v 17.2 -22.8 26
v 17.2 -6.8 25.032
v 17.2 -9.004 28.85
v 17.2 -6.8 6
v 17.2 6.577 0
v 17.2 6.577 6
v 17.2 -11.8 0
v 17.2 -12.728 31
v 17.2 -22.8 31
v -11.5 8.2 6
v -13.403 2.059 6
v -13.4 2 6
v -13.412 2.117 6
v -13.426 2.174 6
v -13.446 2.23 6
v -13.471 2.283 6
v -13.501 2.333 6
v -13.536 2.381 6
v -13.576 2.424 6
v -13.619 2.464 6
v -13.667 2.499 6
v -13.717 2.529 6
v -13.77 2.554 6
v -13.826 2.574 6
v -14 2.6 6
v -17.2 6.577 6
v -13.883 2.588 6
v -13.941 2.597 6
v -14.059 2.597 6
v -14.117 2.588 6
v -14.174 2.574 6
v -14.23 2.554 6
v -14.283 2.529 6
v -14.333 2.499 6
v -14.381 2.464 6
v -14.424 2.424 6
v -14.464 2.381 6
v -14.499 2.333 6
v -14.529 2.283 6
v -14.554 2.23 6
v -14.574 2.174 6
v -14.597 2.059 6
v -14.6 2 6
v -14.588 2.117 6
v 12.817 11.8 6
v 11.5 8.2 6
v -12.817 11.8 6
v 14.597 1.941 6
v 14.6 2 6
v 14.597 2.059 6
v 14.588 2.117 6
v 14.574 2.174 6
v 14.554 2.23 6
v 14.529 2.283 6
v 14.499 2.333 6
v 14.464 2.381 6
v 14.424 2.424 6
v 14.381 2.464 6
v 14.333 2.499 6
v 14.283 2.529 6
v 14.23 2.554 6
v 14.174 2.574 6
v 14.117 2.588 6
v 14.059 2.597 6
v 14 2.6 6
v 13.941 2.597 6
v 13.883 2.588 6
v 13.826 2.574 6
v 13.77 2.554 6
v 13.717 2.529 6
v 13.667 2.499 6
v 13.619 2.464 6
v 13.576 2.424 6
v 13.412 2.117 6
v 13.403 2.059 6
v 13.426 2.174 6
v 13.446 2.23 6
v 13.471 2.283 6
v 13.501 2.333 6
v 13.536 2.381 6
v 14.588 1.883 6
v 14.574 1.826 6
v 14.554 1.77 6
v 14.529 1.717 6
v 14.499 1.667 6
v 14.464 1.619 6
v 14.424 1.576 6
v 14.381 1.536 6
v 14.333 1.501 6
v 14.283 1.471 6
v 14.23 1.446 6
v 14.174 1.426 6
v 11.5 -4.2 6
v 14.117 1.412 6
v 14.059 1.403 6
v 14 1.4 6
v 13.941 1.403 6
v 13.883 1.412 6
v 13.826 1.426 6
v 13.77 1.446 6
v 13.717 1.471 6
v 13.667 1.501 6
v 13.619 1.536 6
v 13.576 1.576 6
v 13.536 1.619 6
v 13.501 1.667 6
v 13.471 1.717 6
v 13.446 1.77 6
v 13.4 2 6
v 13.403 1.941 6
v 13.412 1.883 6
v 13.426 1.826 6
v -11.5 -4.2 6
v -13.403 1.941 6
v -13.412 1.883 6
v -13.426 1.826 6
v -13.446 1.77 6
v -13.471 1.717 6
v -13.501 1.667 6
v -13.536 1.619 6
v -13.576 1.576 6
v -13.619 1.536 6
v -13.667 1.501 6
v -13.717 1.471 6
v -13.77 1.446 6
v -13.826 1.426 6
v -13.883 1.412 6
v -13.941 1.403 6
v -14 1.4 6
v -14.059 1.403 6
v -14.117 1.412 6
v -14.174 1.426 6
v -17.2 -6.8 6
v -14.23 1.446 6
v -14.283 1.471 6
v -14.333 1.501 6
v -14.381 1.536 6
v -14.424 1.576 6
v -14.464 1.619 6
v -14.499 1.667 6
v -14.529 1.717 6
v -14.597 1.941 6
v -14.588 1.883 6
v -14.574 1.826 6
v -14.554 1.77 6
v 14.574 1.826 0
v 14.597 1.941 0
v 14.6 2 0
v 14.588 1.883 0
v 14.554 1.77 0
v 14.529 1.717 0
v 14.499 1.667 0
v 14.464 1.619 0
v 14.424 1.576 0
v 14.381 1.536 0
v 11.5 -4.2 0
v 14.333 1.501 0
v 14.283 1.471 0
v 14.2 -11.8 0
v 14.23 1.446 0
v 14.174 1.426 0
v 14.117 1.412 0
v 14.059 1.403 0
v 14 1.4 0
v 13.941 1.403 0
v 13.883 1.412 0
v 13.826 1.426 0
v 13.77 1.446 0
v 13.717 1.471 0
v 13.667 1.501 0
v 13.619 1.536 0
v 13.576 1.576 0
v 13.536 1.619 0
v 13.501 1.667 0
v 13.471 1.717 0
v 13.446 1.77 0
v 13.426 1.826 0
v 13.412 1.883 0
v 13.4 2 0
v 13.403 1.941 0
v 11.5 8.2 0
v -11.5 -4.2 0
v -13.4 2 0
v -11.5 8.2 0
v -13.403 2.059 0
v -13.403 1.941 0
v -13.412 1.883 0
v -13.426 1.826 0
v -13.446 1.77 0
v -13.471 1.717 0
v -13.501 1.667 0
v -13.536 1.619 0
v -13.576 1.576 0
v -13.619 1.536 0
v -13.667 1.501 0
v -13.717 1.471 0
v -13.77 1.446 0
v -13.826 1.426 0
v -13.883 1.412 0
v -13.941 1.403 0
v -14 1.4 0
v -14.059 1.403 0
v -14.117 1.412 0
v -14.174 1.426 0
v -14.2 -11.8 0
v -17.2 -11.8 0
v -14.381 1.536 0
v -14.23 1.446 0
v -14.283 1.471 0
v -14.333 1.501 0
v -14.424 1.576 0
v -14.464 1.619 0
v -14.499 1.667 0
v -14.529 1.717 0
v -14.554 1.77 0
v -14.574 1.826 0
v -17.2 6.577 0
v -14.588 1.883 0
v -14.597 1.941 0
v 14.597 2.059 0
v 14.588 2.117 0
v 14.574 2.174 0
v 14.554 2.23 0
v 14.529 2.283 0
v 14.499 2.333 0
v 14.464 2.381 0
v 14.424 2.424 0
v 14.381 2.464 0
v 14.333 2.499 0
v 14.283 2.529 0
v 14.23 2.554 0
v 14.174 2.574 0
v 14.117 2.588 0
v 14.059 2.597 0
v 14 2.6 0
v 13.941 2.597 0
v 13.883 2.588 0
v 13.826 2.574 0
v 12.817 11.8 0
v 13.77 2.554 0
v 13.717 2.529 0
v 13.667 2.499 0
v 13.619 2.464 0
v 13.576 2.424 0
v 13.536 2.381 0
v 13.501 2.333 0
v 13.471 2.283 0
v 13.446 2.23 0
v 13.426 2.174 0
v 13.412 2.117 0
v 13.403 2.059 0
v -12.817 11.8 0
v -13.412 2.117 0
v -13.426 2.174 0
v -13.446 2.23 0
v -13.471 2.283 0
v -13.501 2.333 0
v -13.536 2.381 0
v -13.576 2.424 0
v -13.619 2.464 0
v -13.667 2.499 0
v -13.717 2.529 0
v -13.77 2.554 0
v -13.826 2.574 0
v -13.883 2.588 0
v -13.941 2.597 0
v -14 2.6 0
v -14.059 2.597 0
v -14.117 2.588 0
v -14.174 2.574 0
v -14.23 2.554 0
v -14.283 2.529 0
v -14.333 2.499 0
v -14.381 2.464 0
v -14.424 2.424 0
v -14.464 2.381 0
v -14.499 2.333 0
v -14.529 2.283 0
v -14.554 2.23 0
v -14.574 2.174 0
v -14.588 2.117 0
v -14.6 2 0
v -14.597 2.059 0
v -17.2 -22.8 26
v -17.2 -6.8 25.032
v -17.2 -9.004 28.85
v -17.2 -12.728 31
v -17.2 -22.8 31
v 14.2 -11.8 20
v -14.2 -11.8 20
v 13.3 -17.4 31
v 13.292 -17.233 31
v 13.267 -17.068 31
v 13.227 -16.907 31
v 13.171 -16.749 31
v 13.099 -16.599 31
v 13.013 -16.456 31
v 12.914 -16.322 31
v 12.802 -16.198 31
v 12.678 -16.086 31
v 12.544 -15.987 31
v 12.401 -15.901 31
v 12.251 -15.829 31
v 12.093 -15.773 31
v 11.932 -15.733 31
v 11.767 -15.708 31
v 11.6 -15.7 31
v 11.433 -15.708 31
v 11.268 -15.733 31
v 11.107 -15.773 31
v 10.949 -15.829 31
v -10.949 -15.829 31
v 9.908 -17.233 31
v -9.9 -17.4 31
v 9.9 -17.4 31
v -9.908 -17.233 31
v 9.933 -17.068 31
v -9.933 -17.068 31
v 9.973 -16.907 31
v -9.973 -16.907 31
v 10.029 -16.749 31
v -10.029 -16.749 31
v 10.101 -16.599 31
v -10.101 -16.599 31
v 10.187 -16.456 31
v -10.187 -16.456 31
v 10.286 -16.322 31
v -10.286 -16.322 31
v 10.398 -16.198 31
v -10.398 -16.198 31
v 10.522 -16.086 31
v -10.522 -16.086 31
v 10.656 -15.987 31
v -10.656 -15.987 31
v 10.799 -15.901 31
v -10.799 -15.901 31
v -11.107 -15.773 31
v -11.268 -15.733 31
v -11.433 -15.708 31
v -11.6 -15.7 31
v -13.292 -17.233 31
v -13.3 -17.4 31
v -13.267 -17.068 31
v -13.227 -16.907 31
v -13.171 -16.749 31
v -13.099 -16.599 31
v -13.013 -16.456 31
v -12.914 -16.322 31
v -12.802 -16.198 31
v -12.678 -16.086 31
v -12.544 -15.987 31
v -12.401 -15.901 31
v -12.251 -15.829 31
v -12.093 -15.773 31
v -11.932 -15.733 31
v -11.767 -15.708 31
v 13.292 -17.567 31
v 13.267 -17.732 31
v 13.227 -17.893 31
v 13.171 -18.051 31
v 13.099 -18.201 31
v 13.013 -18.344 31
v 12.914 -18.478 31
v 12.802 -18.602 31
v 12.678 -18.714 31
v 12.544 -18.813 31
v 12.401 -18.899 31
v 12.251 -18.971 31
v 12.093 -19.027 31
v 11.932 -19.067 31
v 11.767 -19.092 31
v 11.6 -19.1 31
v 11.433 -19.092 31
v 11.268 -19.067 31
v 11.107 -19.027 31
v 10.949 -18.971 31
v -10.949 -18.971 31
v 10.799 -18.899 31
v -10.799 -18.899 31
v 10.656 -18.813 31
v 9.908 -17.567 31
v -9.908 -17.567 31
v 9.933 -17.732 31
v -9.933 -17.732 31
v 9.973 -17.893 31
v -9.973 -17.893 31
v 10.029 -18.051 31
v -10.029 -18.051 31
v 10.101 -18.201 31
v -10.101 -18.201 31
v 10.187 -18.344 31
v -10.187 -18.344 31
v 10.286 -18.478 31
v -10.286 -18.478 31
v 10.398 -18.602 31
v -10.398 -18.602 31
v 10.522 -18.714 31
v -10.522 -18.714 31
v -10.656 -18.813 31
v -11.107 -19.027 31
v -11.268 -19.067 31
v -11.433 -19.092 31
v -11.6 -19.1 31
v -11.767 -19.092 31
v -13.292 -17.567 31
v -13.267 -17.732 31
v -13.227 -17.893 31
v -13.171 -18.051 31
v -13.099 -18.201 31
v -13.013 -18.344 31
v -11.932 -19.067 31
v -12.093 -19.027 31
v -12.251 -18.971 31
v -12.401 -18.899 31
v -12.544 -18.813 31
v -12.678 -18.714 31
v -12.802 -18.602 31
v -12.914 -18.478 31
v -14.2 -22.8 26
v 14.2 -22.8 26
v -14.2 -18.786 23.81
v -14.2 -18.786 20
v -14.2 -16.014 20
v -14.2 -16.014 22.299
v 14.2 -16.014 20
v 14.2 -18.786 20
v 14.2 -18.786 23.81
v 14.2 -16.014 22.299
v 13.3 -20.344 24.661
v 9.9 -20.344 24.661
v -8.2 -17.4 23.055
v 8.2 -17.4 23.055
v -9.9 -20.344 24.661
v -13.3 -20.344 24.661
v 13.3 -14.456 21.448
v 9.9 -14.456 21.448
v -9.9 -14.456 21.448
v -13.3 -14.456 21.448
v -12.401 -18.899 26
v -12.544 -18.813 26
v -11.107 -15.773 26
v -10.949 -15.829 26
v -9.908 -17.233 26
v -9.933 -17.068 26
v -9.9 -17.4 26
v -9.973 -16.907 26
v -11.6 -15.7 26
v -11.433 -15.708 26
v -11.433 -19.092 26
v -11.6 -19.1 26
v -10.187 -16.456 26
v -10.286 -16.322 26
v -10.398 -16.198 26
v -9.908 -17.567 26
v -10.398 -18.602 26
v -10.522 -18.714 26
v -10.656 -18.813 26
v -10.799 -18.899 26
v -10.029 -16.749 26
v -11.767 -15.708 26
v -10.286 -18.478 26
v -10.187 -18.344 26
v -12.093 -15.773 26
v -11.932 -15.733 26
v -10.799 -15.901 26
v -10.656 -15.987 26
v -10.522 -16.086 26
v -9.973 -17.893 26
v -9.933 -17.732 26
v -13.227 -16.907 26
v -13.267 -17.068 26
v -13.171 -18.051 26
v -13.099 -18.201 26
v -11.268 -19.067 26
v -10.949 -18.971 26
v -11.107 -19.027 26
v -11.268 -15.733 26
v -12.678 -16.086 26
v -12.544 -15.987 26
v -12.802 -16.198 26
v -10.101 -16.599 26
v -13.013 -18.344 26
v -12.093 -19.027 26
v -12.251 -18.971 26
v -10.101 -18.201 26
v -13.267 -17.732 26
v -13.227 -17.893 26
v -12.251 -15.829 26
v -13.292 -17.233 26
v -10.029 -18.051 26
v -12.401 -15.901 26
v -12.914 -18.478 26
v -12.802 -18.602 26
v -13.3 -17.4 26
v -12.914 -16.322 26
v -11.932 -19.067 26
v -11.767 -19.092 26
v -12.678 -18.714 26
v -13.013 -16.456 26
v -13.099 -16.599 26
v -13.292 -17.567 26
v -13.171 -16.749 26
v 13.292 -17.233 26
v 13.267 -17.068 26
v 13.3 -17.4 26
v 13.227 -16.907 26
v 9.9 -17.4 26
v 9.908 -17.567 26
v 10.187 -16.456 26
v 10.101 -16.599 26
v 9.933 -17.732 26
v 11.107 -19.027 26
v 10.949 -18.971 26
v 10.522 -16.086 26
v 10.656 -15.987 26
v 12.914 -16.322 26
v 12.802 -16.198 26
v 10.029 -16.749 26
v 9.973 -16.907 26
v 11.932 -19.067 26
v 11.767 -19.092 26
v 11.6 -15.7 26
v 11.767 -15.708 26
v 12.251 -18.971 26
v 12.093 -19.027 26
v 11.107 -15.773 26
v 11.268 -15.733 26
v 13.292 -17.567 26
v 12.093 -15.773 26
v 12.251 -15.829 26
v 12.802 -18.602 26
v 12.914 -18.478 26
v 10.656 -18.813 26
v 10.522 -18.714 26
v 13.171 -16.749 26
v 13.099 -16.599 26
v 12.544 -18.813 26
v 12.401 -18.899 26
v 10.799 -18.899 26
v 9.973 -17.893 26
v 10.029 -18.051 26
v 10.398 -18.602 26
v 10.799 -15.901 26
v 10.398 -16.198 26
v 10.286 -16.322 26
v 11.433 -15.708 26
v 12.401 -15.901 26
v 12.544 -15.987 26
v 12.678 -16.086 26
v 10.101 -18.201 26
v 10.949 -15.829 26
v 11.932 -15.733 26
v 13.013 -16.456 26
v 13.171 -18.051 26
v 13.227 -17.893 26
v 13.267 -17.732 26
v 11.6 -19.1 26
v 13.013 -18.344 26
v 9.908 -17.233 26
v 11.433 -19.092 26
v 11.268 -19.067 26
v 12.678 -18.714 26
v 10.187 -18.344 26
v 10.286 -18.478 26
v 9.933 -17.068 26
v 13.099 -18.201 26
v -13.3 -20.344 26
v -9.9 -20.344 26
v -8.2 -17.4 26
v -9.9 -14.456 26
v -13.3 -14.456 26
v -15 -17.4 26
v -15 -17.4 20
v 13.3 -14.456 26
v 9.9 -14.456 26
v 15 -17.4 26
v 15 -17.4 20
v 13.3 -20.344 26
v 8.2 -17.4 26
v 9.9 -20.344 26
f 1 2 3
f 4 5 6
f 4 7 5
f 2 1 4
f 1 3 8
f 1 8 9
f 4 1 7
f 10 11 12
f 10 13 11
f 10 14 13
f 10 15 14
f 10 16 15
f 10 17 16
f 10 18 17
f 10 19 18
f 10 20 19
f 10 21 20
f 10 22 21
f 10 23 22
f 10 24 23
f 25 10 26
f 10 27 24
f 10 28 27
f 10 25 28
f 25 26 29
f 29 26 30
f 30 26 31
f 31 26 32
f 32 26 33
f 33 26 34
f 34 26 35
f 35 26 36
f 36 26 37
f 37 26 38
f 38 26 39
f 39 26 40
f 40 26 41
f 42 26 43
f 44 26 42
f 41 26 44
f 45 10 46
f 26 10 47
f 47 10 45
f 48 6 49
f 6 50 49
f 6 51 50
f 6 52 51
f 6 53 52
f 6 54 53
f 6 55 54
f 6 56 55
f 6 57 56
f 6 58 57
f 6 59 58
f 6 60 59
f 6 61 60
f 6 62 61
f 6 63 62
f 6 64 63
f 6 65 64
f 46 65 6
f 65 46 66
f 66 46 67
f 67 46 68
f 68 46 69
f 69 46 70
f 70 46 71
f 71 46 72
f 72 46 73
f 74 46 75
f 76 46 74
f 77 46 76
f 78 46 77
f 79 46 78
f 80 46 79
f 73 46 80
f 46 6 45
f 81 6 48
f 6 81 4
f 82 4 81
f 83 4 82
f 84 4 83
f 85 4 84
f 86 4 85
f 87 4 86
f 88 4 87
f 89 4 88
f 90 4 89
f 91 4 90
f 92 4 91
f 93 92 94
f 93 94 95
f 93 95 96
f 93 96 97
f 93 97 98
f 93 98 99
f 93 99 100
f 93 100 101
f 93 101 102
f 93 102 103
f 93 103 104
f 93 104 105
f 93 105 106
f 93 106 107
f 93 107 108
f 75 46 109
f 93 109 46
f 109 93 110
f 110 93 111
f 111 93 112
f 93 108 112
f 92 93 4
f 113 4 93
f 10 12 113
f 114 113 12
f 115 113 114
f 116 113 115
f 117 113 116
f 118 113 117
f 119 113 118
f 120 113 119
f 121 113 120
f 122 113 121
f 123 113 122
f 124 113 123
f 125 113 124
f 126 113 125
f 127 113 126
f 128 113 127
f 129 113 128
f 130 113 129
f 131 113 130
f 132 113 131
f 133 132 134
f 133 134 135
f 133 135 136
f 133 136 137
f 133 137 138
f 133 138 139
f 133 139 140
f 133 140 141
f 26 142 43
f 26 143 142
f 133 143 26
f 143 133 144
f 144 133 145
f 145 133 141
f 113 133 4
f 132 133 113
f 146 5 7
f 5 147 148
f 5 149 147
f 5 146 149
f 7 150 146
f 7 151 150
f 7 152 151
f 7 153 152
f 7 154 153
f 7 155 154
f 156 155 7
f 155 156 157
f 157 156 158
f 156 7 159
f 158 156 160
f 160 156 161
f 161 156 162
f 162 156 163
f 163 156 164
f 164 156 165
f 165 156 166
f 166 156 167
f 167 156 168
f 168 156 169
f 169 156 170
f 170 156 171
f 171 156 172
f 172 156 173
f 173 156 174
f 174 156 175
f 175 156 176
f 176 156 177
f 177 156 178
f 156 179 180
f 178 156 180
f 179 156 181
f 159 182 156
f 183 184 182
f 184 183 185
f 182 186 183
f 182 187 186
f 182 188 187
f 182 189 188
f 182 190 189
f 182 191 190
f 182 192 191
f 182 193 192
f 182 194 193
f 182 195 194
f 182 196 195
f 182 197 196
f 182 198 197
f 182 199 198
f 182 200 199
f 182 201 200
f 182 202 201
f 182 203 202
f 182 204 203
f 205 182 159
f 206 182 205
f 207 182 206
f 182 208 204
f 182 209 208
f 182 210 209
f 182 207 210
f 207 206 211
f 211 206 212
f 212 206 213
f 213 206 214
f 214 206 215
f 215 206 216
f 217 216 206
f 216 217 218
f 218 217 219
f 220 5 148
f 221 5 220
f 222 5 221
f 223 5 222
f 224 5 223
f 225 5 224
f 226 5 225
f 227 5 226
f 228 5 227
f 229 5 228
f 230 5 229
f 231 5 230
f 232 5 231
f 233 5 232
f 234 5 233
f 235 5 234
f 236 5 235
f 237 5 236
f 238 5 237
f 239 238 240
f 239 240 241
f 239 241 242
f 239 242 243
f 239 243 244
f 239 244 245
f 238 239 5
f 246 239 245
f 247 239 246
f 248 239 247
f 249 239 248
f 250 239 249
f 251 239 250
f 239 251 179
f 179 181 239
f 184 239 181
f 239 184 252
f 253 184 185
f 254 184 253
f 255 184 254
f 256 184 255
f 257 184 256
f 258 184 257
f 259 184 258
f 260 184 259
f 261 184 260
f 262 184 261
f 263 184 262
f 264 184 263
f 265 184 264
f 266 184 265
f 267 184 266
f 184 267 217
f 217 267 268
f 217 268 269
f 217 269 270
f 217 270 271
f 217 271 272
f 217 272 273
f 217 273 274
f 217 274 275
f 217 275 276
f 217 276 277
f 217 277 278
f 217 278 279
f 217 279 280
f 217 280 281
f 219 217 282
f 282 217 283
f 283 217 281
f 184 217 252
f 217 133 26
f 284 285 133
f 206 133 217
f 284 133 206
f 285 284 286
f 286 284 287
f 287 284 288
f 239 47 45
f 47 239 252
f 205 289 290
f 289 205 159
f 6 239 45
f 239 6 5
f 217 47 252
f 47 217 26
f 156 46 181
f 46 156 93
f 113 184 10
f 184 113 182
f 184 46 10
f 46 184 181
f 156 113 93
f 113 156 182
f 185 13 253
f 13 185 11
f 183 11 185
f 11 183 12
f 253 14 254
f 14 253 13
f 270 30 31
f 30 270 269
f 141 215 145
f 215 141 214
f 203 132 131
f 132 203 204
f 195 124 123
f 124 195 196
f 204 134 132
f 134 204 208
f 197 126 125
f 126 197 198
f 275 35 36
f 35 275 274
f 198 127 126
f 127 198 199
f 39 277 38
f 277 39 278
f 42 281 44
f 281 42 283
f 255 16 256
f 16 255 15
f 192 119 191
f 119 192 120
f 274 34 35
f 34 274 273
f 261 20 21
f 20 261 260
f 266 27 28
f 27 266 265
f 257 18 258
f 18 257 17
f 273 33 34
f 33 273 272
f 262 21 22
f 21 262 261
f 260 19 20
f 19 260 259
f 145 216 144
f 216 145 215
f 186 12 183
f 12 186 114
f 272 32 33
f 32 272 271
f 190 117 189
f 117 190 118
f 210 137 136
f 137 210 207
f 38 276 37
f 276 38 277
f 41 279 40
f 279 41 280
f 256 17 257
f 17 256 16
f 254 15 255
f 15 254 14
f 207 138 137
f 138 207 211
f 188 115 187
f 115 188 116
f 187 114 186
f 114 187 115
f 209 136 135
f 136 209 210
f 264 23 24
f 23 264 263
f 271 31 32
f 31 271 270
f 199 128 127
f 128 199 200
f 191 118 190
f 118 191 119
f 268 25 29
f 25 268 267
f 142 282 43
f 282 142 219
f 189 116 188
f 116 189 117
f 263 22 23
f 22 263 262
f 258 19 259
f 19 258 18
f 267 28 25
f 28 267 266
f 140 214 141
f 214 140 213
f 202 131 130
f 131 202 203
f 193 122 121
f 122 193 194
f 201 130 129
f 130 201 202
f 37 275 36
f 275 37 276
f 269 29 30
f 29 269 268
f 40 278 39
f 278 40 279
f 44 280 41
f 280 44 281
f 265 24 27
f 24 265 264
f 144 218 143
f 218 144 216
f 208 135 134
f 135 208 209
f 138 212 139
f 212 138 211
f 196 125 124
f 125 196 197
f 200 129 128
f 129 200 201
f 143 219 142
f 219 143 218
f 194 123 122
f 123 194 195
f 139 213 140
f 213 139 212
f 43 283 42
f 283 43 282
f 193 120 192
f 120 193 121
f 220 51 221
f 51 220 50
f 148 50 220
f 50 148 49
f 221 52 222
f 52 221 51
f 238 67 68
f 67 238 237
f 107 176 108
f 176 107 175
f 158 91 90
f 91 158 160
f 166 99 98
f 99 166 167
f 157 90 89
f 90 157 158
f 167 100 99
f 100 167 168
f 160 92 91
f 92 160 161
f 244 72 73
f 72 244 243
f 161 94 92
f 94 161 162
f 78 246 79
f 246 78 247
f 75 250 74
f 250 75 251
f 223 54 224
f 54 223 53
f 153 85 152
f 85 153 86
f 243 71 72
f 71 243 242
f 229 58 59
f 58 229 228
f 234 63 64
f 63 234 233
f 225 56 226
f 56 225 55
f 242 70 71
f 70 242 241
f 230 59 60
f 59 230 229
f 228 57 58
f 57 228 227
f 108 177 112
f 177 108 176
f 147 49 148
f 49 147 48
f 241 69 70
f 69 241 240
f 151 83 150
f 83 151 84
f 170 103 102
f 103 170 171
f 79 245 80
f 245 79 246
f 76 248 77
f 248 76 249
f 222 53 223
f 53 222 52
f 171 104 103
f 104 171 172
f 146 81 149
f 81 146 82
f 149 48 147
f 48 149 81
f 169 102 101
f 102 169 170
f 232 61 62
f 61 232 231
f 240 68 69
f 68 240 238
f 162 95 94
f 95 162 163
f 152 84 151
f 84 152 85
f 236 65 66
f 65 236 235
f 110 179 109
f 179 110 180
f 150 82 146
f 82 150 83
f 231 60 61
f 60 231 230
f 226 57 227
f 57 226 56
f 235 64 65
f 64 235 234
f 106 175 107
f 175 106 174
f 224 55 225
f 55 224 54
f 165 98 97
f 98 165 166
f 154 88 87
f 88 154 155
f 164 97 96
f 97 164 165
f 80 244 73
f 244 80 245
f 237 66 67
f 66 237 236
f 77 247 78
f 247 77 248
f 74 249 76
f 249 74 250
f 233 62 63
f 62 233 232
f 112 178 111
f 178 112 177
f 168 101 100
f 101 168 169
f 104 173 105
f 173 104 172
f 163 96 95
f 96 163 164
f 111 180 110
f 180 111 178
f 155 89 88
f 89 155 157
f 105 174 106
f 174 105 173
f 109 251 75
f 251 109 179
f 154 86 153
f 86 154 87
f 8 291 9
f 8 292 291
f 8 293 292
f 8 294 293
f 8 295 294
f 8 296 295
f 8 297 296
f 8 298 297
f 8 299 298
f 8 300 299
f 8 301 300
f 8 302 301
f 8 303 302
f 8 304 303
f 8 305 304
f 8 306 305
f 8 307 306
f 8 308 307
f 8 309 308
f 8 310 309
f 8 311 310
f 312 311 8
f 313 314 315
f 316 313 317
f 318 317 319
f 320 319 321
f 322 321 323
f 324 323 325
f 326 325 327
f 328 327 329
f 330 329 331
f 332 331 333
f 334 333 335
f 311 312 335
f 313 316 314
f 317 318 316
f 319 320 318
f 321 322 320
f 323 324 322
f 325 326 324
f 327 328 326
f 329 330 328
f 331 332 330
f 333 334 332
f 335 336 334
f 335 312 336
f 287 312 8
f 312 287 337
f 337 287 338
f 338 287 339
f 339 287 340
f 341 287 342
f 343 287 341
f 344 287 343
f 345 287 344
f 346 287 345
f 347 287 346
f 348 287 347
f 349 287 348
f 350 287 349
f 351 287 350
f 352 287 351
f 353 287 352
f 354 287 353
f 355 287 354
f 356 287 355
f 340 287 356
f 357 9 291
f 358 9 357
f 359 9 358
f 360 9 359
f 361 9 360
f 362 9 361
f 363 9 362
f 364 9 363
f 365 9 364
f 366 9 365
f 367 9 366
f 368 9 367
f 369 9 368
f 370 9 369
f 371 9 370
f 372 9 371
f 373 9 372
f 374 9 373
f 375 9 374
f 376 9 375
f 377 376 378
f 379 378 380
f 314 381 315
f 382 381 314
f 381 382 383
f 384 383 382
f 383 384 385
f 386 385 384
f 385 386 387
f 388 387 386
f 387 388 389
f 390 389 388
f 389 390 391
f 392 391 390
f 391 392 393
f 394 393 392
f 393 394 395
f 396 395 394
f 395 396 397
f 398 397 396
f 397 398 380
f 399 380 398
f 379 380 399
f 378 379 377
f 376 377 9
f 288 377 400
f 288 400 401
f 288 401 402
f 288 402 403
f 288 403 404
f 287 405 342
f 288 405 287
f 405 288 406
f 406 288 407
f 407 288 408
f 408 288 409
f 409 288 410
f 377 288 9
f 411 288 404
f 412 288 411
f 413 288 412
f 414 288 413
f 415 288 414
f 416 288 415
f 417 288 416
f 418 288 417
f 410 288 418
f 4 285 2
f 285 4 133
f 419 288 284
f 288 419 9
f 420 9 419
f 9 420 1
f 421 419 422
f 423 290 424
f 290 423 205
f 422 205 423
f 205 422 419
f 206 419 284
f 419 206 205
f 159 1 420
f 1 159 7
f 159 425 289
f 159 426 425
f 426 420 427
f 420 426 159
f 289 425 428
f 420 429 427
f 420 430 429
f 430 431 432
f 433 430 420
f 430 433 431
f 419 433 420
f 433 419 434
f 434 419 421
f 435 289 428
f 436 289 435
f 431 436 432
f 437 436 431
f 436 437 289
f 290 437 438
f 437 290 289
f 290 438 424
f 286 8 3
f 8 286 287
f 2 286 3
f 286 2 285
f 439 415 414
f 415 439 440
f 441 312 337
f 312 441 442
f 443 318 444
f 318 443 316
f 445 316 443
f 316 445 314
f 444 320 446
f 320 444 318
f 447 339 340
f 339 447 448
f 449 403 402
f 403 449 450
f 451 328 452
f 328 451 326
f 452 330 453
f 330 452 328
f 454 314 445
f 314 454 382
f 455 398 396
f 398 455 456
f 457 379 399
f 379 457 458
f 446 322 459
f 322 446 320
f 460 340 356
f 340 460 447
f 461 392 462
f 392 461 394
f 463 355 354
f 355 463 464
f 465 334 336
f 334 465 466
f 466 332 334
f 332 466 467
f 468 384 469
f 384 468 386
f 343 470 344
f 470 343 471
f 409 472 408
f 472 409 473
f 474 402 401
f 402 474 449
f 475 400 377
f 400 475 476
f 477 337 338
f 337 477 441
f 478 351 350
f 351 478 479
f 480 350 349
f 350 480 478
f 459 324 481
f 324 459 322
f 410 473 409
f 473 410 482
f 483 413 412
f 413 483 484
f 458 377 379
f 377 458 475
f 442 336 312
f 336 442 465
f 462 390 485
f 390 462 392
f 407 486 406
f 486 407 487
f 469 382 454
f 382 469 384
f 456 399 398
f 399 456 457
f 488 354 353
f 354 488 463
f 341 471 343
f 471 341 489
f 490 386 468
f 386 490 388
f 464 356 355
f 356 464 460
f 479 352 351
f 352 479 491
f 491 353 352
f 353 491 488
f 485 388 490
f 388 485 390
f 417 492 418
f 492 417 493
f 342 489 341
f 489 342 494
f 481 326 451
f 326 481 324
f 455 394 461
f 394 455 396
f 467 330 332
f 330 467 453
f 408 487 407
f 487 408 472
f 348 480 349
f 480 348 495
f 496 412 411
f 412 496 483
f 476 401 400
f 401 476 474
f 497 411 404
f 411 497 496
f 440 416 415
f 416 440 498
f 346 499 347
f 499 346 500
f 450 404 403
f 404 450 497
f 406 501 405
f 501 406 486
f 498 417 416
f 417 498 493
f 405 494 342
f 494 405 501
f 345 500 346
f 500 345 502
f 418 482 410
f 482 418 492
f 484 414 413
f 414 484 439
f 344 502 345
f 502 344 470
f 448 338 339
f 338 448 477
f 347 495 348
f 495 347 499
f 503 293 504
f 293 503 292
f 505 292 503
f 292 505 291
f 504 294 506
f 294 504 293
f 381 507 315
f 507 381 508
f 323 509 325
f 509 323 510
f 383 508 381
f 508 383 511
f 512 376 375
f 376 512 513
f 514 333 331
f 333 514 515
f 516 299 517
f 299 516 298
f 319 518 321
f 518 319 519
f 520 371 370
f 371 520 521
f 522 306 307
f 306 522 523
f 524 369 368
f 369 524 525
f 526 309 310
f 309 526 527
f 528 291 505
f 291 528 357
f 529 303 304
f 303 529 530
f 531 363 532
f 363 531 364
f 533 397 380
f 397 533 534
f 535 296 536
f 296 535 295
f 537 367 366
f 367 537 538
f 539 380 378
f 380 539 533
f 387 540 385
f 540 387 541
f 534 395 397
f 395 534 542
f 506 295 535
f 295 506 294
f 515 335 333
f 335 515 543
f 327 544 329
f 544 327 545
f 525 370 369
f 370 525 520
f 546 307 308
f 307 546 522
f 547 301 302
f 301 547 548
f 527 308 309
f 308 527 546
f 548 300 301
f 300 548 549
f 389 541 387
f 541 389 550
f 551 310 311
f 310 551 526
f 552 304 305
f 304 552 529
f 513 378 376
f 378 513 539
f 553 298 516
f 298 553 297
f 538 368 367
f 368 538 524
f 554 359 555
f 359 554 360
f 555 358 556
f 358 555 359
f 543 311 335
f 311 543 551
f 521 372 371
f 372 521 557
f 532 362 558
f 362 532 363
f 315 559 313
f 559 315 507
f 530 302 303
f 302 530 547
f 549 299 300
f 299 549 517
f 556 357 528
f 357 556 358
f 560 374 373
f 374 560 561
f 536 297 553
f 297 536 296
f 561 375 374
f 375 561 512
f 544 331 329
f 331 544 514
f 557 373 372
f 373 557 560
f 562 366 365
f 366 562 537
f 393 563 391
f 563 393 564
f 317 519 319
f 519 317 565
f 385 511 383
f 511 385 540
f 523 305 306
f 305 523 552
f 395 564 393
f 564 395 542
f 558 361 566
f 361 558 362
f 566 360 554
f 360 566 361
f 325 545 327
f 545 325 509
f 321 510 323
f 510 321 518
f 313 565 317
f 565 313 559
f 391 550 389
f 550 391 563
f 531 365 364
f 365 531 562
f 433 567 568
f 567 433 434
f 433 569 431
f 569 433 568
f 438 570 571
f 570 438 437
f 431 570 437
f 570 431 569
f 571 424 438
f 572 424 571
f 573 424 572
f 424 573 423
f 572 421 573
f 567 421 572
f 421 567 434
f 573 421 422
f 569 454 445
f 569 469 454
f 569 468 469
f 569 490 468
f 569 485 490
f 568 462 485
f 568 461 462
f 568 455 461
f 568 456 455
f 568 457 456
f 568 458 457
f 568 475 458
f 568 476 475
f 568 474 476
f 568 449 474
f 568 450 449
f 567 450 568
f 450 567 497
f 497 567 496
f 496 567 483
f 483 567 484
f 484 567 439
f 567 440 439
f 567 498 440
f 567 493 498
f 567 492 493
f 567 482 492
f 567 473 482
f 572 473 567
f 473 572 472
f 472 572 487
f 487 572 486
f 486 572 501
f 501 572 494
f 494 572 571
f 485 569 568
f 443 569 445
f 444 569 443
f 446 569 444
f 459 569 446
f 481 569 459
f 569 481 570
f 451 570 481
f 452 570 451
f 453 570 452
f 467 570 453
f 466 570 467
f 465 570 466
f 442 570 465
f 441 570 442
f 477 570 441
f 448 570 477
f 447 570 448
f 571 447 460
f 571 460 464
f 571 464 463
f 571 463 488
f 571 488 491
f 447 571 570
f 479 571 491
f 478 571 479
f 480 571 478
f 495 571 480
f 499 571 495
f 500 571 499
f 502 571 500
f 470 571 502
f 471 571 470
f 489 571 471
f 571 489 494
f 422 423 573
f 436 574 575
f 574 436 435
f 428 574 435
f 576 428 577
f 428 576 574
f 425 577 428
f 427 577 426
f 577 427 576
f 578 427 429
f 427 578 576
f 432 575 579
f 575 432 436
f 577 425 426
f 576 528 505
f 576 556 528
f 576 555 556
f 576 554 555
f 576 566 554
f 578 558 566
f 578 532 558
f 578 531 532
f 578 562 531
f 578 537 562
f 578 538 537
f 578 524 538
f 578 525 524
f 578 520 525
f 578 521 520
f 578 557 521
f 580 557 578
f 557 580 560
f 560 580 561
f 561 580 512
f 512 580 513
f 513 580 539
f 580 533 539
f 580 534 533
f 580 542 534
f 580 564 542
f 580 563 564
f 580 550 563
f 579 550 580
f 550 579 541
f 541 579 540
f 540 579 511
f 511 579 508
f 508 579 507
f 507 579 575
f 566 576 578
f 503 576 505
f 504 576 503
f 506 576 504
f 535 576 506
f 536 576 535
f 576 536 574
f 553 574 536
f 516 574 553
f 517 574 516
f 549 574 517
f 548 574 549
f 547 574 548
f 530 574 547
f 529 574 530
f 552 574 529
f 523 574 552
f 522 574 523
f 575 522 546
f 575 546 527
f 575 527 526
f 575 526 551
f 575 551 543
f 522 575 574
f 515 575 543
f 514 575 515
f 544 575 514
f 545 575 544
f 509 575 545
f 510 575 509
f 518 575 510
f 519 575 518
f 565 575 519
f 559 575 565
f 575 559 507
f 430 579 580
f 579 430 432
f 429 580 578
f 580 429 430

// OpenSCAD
//-- Direct Drive servo mount remix
//-- by AndrewBCN - Barcelona, Spain - November 2014
//-- GPLV3
//-- from an original design by Gumpwa Luong (Thingiverse #559745)

//-- this small piece is used to mount a servo for auto bed leveling

//-- import test

$fn=64;

// first we import the original part stl and then reverse-engineer
// an identical part

//translate([30,30,8]) import("wilson_servo.stl");
//translate([0,2,8]) import("wilson_servo.stl");

module servo_holder() {
  difference() {
    // base part
    translate([0,0,0]) cube([34.4,23.6,6],center=true);
    
    // carve out the servo and the small angles

    // small angles
    translate([34.4/2,23.6/2+1,0]) rotate ([0,0,-50]) cube([10,8,8],center=true);
    translate([-34.4/2,23.6/2+1,0]) rotate ([0,0,50]) cube([10,8,8],center=true);
    
    // servo
    translate([0,2,0]) cube([23,12.4,8],center=true);

    // servo screw holes
    translate([-23/2-2.5,2,0]) cylinder(r=0.6, h=20, center=true);
    translate([23/2+2.5,2,0]) cylinder(r=0.6, h=20, center=true);

    // hotend carvings
    //translate([0,9.8,9.5]) rotate([90,0,0]) cylinder(r=6, h=20, center=true);
    //translate([0,-10.1,10]) rotate([90,0,0]) cylinder(r=8, h=20, center=true);
    }   
  // vertical part
  difference() {
    union() {
      translate([-34.4/2,-23.6/2,0]) cube([34.4,5,28]);
      translate([-34.4/2,-23.6/2-16+5,28-5]) cube([34.4,16,5]);
      hull() {
        translate([-34.4/2,-23.6/2,-3]) cube([3,5,28]);
        translate([-34.4/2,-23.6/2-16+5,28-5]) cube([3,16,5]);
      }
      hull() {
        translate([34.4/2-3,-23.6/2,-3]) cube([3,5,28]);
        translate([34.4/2-3,-23.6/2-16+5,28-5]) cube([3,16,5]);
      }
      hull() {
        translate([-33/2,-23.6/2,20-3]) cube([33,5,2]);
        translate([-33/2,-23.6/2-16+5,28-5]) cube([33,16,5]);
      }
    }
    translate([-35.4/2,-23.6/2+6,28-4]) rotate([60,0,0]) cube([35.4,16,16]);
    translate([-35.4/2,-23.6/2+6,28-7.7]) rotate([30,0,0]) cube([35.4,16,16]);
    
    // screw holes and nut traps
    translate([-35.4/2+6.1,-23.6/2-5.6,26]) cylinder(r=1.7, h=10, center=true);
    translate([+35.4/2-6.1,-23.6/2-5.6,26]) cylinder(r=1.7, h=10, center=true);
    // nuts
    translate([-35.4/2+6.1,-23.6/2-5.6,20]) cylinder(r=3.4, h=6, $fn=6, center=true);
    translate([+35.4/2-6.1,-23.6/2-5.6,20]) cylinder(r=3.4, h=6, $fn=6, center=true);
  }
}

module extruder_attach() {

}


// print the part
// servo_holder
//translate([0,0,8/2]) rotate([-90,0,90]) clamp();
translate([0,0,6/2]) servo_holder();
// now attach the servo holder to the extruder - we use existing screws
extruder_attach();
// hinge
//translate([-11.5,0,9]) rotate([180,0,0]) hinge();
